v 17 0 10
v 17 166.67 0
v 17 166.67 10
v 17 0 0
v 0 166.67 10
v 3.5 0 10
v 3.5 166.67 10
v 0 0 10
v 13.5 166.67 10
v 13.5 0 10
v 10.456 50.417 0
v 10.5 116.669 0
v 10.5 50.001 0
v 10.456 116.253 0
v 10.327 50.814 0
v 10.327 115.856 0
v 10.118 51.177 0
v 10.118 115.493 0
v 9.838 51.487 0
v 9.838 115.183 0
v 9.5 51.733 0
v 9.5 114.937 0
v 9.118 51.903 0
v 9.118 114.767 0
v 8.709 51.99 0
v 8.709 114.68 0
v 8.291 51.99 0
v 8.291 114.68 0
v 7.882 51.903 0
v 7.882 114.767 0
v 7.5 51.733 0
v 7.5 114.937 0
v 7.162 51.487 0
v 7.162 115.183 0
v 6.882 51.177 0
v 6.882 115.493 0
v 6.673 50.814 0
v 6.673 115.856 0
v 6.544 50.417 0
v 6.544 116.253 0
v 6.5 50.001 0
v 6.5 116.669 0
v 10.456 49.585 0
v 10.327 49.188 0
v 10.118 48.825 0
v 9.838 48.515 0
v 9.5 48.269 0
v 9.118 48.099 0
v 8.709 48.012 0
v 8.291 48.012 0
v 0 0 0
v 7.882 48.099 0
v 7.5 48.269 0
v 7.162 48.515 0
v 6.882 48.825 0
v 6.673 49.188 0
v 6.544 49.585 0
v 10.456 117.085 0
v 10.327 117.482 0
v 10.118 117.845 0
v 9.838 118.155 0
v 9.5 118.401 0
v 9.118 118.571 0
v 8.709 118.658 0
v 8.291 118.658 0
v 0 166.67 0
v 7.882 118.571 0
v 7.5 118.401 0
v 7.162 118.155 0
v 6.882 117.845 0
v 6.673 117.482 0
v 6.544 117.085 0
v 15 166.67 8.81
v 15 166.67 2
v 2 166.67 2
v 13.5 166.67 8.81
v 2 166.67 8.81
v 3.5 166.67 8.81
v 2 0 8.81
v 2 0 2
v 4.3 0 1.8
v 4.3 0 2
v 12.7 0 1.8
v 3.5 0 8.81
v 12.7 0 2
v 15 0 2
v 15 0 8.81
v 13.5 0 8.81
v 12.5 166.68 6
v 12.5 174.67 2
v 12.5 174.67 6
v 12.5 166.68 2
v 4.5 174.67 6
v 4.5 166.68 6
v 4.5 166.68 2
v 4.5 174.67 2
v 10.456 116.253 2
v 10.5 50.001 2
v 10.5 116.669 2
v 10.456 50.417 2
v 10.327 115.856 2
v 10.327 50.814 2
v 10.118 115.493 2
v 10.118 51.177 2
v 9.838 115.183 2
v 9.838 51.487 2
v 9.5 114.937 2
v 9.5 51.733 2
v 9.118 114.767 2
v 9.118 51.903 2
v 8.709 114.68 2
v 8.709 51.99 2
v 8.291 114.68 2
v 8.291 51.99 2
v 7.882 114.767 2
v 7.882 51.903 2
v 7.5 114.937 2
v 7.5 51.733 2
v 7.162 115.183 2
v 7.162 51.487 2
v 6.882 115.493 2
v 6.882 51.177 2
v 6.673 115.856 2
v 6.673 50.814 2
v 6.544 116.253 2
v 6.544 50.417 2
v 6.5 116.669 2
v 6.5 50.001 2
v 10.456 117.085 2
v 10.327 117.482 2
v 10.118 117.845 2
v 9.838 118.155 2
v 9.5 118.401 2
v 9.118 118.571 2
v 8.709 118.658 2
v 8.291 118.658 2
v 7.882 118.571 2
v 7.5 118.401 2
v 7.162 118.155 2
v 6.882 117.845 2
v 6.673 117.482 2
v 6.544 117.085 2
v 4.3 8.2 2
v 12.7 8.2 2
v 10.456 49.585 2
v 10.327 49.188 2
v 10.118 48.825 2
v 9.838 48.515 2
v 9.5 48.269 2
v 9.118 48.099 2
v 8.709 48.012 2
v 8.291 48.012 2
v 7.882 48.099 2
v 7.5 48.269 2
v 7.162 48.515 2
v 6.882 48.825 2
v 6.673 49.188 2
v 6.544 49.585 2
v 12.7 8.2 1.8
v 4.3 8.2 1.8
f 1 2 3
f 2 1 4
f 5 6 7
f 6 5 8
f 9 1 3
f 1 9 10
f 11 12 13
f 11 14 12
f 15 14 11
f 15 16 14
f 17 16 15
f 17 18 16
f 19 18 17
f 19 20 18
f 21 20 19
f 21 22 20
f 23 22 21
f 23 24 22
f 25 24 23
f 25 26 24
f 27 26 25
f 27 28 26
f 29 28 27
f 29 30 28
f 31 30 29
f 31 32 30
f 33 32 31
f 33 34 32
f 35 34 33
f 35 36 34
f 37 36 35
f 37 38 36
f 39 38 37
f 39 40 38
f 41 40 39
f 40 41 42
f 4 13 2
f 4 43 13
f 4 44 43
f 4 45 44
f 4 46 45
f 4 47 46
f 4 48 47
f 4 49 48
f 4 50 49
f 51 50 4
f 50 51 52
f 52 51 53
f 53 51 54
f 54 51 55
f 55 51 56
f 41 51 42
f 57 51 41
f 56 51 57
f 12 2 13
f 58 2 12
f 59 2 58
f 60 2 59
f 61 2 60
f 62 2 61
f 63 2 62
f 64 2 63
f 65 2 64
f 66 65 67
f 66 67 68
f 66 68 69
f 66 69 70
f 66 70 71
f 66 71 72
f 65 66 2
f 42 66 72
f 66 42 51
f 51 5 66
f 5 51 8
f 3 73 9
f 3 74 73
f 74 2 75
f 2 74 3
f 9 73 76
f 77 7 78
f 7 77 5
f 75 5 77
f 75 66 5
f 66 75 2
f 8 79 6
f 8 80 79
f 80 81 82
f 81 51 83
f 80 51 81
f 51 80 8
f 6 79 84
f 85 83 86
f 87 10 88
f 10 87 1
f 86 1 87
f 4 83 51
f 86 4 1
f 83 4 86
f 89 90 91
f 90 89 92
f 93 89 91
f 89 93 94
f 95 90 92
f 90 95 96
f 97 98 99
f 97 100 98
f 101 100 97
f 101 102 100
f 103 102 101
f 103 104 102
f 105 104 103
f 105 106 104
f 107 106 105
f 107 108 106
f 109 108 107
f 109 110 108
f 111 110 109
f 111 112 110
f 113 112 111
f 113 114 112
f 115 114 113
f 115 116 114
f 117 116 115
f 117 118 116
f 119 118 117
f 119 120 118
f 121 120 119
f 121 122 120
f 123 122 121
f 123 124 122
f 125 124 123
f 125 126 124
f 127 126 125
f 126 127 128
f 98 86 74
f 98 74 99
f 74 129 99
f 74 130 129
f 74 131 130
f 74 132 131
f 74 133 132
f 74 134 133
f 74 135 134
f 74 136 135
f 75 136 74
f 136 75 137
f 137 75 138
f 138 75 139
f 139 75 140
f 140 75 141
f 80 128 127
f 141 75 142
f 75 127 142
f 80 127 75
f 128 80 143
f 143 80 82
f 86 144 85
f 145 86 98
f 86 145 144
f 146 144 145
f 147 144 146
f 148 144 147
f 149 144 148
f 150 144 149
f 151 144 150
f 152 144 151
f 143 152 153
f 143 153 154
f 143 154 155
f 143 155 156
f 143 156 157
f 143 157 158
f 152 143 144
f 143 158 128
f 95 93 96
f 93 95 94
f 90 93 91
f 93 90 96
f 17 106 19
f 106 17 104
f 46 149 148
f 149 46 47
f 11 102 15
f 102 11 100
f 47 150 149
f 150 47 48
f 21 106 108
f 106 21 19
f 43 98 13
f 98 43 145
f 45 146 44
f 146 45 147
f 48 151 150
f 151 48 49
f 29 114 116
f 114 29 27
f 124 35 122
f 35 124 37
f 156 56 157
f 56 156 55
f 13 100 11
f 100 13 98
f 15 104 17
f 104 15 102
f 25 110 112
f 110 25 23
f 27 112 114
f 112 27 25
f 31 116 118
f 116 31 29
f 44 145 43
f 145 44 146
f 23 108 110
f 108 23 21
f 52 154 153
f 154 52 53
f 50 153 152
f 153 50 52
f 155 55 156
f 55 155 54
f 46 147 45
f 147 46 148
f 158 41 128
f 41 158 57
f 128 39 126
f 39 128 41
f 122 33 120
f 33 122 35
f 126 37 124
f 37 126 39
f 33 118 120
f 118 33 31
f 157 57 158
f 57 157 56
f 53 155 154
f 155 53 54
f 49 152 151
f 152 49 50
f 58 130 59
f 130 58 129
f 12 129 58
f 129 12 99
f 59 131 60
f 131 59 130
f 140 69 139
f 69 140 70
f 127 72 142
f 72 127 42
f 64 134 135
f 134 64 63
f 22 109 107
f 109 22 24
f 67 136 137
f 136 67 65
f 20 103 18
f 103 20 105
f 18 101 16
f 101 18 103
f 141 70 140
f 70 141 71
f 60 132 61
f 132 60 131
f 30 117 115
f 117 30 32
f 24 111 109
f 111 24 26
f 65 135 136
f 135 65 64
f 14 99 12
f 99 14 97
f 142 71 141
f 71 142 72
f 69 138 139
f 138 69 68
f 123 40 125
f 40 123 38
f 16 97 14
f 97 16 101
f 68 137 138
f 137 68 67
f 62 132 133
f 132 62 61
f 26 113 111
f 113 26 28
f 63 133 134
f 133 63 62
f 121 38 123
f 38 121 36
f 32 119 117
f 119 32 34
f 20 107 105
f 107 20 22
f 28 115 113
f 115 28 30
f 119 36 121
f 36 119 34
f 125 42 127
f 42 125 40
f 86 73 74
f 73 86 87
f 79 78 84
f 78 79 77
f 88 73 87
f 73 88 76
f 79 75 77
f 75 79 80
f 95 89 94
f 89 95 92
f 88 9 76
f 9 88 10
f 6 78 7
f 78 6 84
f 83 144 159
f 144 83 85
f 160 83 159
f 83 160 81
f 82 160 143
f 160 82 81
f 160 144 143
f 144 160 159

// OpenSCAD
// ============================================
// Artemis II LED Tracker - Channel Segment
// Print 6x in silk specter filament
// Bambu Lab A1 Mini (180x180x180mm)
// ============================================
// Settings: 0.2mm layer height, 3 walls, 15% infill
// Orientation: print flat (base down)
// ============================================

/* [Strip Properties] */
strip_width = 12;          // LED strip width (mm)
strip_clearance = 0.5;     // Clearance each side of strip (mm)

/* [Channel Dimensions] */
wall = 2;                  // Side wall thickness (mm)
base = 2;                  // Bottom thickness (mm)
total_height = 10;         // Total wall height (mm)
lip_inset = 1.5;           // Inward lip width - holds diffuser (mm)
lip_h = 1.2;               // Lip thickness (mm)

/* [Segment] */
leds_per_seg = 10;         // LEDs per segment (10 x 6 = 60 total)
led_pitch = 16.667;        // LED spacing (mm) = 1000/60

/* [Joint - tab/slot connection] */
tab_len = 8;               // Tab length (mm)
tab_w = 8;                 // Tab width (mm)
tab_h = 4;                 // Tab height (mm)
tol = 0.2;                 // Joint tolerance (mm)

/* [Mounting] */
screw_d = 4;               // Screw hole diameter (mm)

/* [Computed - do not change] */
seg_len = leds_per_seg * led_pitch;  // ~166.67mm
inner_w = strip_width + strip_clearance * 2;  // 13mm
outer_w = inner_w + wall * 2;  // 17mm
$fn = 30;

module channel_segment() {
    difference() {
        union() {
            // Solid block, then carve out the channel
            cube([outer_w, seg_len, total_height]);

            // Male tab (+Y end)
            translate([(outer_w - tab_w) / 2, seg_len - 0.01, base])
                cube([tab_w, tab_len + 0.01, tab_h]);
        }

        // Carve main channel (full inner height, but leave lips)
        // Lower portion: full inner width (below lips)
        translate([wall, -0.01, base])
            cube([inner_w, seg_len + 0.02, total_height - base - lip_h + 0.01]);

        // Upper portion: only between lips (narrower)
        translate([wall + lip_inset, -0.01, total_height - lip_h - 0.01])
            cube([inner_w - lip_inset * 2, seg_len + 0.02, lip_h + 0.02]);

        // Female slot (-Y end)
        translate([(outer_w - tab_w) / 2 - tol, -0.01, base - tol])
            cube([tab_w + tol * 2, tab_len + tol + 0.01, tab_h + tol * 2]);

        // Mounting screw holes
        for (y = [seg_len * 0.3, seg_len * 0.7])
            translate([outer_w / 2, y, -0.01])
                cylinder(d = screw_d, h = base + 0.02);
    }
}

channel_segment();
